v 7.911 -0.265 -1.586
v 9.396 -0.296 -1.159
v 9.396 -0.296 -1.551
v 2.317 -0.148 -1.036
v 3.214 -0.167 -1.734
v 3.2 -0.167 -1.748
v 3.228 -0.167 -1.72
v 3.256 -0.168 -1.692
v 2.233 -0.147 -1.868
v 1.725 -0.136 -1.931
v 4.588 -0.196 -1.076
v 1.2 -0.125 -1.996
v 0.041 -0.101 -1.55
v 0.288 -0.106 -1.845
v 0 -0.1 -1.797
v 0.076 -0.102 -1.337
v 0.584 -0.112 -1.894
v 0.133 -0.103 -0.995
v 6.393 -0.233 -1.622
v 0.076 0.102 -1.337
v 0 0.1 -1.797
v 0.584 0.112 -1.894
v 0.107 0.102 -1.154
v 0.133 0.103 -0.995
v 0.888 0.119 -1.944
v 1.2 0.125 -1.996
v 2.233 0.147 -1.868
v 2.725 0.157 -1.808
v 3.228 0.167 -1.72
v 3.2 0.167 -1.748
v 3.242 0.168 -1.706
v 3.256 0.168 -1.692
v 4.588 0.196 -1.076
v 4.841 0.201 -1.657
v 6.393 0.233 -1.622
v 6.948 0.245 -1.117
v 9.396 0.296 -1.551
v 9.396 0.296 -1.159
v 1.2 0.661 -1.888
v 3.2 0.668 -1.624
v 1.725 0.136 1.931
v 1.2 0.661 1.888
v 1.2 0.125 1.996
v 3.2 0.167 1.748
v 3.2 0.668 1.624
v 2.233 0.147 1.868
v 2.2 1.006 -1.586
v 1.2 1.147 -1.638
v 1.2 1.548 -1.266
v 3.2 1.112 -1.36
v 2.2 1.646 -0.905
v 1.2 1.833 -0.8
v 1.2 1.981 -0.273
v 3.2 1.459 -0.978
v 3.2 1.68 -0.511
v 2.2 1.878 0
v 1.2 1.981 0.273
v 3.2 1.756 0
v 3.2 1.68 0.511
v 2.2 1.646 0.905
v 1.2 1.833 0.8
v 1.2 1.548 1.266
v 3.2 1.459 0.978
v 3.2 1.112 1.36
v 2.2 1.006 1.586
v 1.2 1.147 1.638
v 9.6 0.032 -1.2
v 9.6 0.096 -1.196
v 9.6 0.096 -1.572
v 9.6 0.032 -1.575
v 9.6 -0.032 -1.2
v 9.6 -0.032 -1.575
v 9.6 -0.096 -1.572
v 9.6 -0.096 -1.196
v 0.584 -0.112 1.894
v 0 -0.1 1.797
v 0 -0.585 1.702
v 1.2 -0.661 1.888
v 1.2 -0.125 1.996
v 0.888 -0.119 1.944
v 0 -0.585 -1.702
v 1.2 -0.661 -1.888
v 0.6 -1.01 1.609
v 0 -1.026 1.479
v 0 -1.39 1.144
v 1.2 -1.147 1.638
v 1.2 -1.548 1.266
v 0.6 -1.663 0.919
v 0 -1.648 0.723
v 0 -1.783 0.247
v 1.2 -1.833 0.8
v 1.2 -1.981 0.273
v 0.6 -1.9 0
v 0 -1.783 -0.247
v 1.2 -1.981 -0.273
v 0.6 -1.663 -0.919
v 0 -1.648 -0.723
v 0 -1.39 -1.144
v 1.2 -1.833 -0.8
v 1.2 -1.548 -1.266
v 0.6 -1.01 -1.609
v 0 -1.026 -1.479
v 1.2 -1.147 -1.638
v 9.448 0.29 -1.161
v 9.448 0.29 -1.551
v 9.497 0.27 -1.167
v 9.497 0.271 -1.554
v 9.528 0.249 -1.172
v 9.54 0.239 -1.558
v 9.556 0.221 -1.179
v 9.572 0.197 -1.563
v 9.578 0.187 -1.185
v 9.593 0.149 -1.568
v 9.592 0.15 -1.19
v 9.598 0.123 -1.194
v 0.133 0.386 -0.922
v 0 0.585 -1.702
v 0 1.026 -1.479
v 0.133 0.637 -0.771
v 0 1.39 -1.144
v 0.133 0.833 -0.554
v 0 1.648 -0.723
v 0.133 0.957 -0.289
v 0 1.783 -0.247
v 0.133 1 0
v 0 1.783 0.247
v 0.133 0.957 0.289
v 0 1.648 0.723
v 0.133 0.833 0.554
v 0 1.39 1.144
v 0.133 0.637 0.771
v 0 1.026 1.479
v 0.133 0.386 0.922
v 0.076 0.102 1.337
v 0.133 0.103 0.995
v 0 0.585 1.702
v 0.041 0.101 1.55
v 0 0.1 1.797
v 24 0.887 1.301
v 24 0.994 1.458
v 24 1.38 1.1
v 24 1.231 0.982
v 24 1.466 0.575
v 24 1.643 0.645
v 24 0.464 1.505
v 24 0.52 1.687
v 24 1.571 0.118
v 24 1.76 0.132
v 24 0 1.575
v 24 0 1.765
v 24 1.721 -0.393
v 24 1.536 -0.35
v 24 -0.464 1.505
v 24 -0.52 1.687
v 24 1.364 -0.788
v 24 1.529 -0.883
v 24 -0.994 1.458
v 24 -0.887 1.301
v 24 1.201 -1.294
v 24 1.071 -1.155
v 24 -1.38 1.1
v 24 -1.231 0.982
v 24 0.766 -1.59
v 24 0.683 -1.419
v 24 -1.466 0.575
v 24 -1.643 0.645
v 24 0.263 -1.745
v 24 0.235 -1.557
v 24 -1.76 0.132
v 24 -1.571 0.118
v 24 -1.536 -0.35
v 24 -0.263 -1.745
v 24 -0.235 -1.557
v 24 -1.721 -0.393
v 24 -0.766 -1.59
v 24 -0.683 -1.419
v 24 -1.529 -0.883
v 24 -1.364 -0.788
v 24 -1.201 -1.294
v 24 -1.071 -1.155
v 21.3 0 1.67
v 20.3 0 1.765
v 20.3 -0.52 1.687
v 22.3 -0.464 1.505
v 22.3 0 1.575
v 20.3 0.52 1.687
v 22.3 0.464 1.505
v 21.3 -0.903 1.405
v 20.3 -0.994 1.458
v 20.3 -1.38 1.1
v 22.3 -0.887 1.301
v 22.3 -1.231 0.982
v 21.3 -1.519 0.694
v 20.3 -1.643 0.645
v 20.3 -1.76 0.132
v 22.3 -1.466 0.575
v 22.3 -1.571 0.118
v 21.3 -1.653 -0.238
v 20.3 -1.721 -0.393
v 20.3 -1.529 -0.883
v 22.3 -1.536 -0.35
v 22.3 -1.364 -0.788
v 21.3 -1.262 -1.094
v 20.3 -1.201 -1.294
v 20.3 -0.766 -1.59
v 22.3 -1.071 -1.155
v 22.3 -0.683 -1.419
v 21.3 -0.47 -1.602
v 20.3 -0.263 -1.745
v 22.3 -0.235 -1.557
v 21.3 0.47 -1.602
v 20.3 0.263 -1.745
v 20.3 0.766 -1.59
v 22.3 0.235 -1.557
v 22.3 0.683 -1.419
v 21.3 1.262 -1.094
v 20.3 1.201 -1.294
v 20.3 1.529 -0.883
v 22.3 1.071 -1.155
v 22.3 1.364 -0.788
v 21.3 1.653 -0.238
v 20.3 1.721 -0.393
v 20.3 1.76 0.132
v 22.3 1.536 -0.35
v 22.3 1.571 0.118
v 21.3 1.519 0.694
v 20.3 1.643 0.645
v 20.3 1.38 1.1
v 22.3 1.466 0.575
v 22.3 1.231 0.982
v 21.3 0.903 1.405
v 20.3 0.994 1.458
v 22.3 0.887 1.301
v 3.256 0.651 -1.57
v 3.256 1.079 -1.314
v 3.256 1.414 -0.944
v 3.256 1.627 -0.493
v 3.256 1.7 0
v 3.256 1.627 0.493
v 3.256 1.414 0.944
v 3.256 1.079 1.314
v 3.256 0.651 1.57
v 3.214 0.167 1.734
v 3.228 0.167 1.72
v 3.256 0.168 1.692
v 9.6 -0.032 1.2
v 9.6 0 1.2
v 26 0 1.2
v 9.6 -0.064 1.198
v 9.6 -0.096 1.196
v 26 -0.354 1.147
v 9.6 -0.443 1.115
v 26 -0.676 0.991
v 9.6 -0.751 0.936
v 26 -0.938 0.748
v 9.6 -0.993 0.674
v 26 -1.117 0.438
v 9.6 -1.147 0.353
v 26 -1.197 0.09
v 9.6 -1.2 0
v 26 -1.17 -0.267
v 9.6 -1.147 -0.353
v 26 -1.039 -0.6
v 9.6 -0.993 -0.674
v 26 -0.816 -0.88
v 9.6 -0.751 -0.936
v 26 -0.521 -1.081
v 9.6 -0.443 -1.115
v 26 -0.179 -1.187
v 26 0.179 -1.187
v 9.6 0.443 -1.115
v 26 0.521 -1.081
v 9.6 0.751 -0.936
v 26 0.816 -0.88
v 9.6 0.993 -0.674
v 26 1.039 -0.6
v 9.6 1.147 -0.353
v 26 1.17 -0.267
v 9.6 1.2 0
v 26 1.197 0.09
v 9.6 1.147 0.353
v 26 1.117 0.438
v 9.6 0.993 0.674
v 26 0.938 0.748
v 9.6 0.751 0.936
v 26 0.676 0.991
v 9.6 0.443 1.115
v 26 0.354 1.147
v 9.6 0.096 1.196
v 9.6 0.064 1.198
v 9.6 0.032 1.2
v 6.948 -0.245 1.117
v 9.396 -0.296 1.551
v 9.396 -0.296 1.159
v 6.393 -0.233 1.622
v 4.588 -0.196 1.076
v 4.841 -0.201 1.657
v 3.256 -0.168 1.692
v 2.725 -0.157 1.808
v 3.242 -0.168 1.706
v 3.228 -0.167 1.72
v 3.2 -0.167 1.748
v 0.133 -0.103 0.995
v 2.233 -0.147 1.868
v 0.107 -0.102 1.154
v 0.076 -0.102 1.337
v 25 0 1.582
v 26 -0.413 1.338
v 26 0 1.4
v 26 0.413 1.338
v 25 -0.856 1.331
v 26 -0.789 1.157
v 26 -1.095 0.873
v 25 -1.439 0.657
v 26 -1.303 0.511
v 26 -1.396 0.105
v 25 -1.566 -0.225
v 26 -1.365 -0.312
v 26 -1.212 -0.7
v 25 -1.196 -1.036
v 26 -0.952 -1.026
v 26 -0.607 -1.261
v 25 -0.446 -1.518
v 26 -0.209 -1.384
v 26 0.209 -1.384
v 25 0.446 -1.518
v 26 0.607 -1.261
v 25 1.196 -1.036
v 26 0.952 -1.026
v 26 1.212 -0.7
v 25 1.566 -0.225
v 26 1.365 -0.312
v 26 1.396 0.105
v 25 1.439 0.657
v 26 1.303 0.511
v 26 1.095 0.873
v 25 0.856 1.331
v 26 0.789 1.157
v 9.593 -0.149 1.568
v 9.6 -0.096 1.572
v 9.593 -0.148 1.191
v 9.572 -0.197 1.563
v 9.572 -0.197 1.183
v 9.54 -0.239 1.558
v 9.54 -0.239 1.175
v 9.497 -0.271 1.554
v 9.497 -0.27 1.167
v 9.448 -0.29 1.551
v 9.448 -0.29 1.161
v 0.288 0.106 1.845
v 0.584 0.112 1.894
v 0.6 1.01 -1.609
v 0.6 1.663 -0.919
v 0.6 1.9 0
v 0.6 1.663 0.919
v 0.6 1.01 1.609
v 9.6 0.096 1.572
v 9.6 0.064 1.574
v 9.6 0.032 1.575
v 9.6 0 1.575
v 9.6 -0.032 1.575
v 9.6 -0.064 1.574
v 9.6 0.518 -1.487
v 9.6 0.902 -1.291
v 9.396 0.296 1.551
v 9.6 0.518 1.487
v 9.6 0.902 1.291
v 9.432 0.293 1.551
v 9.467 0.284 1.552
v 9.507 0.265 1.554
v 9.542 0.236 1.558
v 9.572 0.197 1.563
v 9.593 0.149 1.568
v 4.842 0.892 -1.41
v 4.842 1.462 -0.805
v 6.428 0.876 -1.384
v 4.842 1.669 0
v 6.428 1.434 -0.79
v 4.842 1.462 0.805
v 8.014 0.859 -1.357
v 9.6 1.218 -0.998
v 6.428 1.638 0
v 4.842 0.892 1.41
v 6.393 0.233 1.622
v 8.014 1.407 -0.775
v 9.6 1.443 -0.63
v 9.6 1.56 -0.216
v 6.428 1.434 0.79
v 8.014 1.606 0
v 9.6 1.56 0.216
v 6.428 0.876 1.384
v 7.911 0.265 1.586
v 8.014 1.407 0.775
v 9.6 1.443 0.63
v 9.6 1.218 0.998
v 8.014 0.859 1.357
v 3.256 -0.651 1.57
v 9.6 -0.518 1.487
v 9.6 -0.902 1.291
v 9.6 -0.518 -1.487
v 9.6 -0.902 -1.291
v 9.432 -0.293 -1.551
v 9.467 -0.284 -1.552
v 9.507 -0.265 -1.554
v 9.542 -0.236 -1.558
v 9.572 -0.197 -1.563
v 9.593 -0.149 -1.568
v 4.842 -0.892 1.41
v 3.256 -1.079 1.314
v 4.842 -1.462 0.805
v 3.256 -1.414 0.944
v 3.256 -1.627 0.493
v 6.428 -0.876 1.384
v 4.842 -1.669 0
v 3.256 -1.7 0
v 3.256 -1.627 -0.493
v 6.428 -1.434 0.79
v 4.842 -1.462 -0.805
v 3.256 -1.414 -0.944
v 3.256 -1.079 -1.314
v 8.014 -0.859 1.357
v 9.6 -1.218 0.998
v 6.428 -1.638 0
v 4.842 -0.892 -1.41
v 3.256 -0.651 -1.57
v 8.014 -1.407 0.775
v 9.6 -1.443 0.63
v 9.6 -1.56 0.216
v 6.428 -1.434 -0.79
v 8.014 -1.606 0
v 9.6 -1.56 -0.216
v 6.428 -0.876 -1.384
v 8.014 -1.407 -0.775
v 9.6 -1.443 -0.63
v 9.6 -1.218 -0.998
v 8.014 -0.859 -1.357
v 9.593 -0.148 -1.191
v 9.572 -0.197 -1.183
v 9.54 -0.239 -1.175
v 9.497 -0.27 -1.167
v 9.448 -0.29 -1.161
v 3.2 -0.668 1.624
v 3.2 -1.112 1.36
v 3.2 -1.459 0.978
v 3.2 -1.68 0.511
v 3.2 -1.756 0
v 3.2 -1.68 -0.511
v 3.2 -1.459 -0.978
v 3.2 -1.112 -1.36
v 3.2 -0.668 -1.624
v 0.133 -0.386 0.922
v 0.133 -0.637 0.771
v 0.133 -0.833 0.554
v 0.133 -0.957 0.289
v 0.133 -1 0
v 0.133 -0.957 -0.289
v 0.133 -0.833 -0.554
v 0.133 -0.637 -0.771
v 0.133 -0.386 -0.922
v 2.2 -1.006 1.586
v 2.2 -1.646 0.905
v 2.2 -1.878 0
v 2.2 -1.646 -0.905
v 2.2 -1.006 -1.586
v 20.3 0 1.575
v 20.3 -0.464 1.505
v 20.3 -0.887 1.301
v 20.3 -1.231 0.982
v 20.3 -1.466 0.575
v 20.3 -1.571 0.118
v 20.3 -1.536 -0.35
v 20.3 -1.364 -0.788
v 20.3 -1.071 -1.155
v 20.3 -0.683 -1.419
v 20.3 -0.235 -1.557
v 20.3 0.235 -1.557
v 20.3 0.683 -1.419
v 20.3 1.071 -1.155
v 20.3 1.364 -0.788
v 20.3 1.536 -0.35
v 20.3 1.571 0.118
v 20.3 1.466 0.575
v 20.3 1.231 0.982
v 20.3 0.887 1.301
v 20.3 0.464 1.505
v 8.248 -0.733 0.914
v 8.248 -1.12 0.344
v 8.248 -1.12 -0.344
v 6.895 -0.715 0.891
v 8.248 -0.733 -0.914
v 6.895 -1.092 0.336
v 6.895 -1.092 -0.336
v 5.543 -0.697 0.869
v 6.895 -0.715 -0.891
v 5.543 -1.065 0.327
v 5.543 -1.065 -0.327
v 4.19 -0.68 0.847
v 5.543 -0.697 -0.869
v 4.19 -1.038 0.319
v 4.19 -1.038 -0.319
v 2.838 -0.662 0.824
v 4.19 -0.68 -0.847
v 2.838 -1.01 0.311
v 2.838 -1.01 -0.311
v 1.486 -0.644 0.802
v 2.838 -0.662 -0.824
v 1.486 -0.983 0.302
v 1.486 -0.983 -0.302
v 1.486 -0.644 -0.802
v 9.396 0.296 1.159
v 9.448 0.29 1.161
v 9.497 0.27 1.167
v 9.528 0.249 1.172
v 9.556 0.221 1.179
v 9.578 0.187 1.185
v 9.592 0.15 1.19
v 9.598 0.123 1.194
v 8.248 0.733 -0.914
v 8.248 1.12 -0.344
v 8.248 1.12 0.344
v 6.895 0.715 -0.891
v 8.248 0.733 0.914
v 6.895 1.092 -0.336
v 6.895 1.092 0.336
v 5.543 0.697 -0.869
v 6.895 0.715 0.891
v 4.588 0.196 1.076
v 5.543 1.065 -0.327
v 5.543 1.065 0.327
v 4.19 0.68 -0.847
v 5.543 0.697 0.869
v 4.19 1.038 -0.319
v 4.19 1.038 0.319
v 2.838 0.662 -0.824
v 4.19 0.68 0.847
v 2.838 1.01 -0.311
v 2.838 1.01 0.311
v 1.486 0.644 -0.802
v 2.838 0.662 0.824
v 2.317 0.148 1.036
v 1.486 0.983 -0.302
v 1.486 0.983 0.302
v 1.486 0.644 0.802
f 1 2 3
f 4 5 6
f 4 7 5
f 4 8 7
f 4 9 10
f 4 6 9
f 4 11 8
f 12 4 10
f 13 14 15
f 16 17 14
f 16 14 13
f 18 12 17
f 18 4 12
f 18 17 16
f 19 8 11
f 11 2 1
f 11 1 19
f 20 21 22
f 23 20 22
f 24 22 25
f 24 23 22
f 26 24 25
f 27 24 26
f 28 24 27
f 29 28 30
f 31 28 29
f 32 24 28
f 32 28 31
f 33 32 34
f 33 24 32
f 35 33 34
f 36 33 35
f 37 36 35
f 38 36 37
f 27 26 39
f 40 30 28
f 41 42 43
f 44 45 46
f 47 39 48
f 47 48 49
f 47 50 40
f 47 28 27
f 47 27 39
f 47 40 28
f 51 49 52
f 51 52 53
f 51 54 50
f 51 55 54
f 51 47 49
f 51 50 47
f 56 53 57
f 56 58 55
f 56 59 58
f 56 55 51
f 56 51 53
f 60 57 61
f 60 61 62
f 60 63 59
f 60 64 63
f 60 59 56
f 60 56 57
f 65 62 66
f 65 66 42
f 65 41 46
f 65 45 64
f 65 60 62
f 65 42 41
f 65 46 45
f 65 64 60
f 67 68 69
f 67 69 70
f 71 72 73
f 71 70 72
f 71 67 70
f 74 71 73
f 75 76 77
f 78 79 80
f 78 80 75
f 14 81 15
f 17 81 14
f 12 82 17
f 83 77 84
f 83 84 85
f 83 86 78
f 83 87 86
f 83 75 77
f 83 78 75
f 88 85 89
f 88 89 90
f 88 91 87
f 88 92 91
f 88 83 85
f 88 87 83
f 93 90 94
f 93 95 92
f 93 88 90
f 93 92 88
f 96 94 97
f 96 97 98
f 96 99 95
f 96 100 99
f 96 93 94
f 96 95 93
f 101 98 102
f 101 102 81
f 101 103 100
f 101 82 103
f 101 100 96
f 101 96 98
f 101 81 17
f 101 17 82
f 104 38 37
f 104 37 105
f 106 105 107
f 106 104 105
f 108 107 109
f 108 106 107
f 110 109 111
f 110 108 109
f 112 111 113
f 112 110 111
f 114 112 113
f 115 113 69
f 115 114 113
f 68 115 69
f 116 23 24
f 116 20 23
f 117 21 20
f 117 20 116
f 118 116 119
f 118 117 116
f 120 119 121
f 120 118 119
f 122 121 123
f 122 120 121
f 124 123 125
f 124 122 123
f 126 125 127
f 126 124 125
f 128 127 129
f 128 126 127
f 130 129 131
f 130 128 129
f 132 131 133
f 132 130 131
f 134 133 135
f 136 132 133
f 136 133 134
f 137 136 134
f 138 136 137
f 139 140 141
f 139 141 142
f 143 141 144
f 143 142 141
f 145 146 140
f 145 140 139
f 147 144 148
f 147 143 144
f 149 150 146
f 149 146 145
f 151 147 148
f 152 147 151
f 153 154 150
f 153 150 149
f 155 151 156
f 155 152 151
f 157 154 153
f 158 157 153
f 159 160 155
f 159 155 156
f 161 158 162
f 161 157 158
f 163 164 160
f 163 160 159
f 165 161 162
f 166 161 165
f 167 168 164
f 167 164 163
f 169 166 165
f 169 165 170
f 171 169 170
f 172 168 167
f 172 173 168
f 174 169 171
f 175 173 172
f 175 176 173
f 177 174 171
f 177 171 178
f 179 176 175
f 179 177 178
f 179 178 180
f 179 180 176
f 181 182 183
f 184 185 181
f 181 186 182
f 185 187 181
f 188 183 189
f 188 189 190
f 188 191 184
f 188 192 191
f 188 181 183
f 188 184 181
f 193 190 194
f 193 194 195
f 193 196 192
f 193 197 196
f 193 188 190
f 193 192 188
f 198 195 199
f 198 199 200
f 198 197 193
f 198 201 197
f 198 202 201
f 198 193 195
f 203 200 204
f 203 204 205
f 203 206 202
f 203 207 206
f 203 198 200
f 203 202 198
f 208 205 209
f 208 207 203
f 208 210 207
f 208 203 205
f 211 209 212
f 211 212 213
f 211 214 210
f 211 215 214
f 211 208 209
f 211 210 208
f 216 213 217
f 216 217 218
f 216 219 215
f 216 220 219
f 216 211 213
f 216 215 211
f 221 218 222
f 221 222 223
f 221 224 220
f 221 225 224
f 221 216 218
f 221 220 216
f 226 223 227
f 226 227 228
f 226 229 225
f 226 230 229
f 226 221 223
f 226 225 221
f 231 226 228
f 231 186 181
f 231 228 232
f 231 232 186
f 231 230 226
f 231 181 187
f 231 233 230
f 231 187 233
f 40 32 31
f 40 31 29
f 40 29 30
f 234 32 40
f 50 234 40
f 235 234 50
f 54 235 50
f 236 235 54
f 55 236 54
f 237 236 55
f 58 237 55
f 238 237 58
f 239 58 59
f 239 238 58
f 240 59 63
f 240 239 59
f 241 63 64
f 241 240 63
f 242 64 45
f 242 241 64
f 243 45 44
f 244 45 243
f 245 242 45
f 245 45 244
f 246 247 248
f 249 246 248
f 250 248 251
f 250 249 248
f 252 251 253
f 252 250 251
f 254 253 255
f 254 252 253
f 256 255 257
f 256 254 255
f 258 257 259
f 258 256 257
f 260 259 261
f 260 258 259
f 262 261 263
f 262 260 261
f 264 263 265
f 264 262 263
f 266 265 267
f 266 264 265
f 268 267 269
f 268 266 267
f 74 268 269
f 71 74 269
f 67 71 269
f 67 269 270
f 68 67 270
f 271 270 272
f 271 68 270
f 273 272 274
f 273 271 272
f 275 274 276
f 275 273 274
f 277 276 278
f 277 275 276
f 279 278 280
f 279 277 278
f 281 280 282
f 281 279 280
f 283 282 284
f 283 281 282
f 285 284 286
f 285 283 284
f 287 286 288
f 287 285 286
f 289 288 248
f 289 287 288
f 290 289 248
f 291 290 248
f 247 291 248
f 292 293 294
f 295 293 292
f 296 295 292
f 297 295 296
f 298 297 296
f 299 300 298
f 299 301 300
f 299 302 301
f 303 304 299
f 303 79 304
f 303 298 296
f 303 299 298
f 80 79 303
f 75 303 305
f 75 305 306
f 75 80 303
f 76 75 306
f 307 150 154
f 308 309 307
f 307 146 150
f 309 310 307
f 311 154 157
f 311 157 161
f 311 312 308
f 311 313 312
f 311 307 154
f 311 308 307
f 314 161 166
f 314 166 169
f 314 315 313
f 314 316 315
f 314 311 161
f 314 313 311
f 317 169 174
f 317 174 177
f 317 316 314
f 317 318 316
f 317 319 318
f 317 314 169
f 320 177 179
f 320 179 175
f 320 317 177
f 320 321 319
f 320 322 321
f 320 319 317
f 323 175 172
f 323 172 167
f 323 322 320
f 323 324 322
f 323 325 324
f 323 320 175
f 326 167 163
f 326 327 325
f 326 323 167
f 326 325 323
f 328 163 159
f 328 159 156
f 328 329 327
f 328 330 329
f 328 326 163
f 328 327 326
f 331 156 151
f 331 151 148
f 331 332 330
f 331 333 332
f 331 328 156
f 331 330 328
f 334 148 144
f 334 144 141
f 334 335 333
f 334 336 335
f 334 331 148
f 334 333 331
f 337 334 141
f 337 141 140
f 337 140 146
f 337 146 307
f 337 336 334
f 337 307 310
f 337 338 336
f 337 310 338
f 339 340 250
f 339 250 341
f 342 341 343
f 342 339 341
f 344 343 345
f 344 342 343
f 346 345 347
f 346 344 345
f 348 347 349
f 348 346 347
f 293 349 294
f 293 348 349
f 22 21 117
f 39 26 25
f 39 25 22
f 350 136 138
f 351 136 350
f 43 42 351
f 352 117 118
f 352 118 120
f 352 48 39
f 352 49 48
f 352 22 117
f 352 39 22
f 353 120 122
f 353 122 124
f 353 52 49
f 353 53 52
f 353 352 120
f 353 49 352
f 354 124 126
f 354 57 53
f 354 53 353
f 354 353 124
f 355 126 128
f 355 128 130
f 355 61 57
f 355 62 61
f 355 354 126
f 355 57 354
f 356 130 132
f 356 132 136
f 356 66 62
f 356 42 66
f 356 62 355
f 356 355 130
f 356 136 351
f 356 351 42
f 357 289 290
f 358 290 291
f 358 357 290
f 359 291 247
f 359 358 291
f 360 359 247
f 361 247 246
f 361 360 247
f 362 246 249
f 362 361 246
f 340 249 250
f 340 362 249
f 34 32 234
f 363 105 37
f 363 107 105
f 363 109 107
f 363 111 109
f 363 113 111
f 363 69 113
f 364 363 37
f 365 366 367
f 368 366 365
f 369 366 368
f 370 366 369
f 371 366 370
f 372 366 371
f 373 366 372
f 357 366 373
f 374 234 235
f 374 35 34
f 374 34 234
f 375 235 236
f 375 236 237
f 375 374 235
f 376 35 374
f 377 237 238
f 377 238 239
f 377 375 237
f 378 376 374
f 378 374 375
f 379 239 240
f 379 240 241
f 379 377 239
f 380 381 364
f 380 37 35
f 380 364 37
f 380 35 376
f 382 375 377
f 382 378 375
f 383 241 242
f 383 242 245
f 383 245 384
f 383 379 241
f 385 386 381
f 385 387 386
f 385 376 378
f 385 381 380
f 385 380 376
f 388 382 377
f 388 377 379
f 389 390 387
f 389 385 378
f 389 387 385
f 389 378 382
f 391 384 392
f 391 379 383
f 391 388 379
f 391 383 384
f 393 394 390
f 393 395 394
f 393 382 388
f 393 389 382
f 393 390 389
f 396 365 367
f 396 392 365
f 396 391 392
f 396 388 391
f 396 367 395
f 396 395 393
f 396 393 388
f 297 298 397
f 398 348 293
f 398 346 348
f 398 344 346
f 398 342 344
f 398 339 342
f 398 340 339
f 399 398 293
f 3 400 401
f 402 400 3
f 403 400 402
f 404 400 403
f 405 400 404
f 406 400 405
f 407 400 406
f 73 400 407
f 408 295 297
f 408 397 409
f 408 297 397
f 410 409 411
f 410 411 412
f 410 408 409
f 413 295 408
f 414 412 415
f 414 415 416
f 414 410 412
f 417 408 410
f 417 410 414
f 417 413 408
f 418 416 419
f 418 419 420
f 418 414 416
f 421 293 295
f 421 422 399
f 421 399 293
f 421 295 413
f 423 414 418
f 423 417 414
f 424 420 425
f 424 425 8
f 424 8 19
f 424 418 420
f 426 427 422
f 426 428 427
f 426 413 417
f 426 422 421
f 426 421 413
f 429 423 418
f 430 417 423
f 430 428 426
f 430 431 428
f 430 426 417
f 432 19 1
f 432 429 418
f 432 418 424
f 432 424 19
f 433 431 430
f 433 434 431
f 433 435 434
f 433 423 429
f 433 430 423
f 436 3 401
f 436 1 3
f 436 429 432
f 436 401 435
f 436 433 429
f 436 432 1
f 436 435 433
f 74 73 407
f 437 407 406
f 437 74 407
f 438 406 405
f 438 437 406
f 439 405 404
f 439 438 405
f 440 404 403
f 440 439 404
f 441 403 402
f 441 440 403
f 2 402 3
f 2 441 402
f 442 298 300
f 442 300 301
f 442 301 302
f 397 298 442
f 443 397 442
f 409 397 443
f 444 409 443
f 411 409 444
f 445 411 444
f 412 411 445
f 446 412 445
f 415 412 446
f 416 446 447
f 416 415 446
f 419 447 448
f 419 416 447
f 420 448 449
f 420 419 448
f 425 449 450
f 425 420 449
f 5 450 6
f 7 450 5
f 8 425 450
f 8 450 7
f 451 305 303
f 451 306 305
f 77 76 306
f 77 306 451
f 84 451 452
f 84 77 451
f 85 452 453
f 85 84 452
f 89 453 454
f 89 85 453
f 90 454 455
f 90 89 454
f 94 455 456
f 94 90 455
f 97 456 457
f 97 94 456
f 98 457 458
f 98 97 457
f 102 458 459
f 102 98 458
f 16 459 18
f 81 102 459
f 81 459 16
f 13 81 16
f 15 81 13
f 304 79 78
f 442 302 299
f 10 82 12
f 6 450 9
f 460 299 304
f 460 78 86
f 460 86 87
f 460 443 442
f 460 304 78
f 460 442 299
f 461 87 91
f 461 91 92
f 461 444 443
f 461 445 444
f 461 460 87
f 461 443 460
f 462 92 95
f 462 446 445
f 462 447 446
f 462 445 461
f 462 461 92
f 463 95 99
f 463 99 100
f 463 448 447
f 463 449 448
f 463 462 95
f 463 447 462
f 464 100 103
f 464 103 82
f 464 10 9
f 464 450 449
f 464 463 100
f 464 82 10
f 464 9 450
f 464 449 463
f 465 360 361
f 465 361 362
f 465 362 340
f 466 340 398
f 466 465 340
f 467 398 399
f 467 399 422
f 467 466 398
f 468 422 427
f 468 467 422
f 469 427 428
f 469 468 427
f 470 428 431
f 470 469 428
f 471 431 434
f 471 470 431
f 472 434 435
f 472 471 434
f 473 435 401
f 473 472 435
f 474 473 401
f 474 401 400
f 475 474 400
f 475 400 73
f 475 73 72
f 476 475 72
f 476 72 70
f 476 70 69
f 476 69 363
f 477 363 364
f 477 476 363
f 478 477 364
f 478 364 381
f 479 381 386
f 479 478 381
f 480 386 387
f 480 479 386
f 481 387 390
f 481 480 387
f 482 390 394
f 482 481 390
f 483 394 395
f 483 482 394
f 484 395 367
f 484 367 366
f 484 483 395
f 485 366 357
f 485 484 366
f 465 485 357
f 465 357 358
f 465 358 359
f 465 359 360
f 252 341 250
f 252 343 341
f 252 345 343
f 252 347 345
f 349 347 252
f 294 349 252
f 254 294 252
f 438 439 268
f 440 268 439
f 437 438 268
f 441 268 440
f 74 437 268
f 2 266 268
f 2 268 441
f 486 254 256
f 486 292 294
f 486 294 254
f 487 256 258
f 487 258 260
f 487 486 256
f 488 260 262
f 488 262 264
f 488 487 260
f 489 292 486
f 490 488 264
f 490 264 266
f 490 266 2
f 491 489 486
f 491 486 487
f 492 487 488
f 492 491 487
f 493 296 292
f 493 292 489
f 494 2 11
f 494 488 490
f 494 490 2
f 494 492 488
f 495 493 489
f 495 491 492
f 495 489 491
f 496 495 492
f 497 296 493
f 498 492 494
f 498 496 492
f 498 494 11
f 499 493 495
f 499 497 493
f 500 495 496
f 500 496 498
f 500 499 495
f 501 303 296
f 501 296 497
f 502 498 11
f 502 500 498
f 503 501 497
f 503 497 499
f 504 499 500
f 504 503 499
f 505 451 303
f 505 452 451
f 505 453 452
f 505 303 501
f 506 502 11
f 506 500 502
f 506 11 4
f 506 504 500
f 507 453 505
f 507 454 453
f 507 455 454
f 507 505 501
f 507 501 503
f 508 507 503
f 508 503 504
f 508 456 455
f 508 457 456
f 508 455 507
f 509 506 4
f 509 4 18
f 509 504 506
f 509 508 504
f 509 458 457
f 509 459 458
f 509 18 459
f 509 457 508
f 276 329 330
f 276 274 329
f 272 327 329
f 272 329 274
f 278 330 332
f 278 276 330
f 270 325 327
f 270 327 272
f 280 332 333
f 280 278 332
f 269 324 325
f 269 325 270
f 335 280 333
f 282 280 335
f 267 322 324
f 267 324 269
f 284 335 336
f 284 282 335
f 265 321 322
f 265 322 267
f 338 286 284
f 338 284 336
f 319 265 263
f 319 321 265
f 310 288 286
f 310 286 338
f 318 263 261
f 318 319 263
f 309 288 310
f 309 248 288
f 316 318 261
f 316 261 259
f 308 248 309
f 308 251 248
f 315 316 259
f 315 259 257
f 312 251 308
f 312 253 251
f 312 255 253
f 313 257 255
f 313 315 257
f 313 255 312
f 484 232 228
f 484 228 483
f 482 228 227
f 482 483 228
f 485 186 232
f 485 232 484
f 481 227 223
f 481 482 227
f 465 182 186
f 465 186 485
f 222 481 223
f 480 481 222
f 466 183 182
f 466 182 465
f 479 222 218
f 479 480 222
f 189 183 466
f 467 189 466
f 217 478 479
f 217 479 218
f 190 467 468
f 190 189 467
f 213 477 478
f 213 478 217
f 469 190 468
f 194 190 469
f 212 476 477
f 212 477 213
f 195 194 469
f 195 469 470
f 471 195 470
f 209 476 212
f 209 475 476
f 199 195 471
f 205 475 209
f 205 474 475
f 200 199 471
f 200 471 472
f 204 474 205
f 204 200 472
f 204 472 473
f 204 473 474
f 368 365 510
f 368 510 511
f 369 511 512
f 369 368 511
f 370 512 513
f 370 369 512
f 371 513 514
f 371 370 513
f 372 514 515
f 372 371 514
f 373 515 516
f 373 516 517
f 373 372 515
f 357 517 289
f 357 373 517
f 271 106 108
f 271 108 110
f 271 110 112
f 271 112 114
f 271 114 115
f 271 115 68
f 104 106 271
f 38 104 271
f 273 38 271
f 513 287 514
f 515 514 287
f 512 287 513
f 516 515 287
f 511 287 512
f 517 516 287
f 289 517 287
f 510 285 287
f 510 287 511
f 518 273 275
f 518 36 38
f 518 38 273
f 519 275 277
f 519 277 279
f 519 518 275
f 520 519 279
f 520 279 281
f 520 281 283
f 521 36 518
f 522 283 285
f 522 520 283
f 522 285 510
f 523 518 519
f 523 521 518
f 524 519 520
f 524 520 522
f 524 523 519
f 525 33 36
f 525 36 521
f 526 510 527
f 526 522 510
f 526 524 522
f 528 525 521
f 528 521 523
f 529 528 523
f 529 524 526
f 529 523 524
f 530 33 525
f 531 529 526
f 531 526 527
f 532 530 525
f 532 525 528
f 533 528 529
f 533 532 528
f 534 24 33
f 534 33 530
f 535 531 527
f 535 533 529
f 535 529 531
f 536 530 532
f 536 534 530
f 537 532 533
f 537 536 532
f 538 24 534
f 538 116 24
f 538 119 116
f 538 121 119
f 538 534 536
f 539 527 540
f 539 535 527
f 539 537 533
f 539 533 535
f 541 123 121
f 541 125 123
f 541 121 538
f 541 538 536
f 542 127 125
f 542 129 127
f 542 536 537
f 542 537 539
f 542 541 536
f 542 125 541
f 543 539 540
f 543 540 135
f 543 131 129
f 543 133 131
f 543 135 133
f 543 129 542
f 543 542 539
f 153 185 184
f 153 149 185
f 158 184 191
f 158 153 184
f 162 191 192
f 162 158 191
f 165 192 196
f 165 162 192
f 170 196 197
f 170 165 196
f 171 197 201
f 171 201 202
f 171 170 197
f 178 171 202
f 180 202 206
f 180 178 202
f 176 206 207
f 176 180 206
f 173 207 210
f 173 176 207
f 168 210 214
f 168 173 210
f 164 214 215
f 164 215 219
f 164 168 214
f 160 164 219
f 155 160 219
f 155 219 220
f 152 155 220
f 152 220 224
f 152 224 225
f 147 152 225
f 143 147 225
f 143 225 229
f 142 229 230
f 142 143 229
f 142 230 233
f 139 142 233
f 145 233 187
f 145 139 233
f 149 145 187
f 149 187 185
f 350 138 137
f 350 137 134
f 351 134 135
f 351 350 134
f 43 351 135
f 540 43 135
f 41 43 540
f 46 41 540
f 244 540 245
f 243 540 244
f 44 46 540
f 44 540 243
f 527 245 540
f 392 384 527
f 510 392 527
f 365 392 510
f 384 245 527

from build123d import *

# Parameters (mm, degrees)
CORTE_EXTRUS_O1_DEPTH = 5


with BuildPart() as part:
    # Esboço1 → Revolução1 (revolve)
    with BuildSketch(Plane.XY, mode=Mode.PRIVATE) as revolu_o1_sk:
        Polygon((0.133333333, 1), (0, 1.8), (1.2, 2), (3.2, 1.756376953), (3.256376953, 1.7), (9.6, 1.575), (20.3, 1.575), (20.3, 1.765), (22.3, 1.575), (24, 1.575), (24, 1.765), (26, 1.4), (26, 1.2), (9.6, 1.2), align=None)
    revolve(revolu_o1_sk.sketch.rotate(Axis((0, 0, 0), (1, 0, 0)), 90), axis=Axis((0, 0, 0), (1, 0, 0)))

    # Esboço2 → Corte-extrusão1 (cut, symmetric)
    with BuildSketch(Plane.XY):
        with BuildLine():
            Line((0, 0.1), (9.395834237, 0.295746547))
            ThreePointArc((9.395834237, 0.295746547), (9.539940787, 0.238676521), (9.6, 0.095789935))
            Line((9.6, 0.095789935), (9.6, -0.095789935))
            ThreePointArc((9.6, -0.095789935), (9.539940787, -0.238676521), (9.395834237, -0.295746547))
            Line((9.395834237, -0.295746547), (0, -0.1))
            Line((0, -0.1), (0, 0.1))
        make_face()
    extrude(amount=CORTE_EXTRUS_O1_DEPTH, both=True, mode=Mode.SUBTRACT)


solid = part.part
